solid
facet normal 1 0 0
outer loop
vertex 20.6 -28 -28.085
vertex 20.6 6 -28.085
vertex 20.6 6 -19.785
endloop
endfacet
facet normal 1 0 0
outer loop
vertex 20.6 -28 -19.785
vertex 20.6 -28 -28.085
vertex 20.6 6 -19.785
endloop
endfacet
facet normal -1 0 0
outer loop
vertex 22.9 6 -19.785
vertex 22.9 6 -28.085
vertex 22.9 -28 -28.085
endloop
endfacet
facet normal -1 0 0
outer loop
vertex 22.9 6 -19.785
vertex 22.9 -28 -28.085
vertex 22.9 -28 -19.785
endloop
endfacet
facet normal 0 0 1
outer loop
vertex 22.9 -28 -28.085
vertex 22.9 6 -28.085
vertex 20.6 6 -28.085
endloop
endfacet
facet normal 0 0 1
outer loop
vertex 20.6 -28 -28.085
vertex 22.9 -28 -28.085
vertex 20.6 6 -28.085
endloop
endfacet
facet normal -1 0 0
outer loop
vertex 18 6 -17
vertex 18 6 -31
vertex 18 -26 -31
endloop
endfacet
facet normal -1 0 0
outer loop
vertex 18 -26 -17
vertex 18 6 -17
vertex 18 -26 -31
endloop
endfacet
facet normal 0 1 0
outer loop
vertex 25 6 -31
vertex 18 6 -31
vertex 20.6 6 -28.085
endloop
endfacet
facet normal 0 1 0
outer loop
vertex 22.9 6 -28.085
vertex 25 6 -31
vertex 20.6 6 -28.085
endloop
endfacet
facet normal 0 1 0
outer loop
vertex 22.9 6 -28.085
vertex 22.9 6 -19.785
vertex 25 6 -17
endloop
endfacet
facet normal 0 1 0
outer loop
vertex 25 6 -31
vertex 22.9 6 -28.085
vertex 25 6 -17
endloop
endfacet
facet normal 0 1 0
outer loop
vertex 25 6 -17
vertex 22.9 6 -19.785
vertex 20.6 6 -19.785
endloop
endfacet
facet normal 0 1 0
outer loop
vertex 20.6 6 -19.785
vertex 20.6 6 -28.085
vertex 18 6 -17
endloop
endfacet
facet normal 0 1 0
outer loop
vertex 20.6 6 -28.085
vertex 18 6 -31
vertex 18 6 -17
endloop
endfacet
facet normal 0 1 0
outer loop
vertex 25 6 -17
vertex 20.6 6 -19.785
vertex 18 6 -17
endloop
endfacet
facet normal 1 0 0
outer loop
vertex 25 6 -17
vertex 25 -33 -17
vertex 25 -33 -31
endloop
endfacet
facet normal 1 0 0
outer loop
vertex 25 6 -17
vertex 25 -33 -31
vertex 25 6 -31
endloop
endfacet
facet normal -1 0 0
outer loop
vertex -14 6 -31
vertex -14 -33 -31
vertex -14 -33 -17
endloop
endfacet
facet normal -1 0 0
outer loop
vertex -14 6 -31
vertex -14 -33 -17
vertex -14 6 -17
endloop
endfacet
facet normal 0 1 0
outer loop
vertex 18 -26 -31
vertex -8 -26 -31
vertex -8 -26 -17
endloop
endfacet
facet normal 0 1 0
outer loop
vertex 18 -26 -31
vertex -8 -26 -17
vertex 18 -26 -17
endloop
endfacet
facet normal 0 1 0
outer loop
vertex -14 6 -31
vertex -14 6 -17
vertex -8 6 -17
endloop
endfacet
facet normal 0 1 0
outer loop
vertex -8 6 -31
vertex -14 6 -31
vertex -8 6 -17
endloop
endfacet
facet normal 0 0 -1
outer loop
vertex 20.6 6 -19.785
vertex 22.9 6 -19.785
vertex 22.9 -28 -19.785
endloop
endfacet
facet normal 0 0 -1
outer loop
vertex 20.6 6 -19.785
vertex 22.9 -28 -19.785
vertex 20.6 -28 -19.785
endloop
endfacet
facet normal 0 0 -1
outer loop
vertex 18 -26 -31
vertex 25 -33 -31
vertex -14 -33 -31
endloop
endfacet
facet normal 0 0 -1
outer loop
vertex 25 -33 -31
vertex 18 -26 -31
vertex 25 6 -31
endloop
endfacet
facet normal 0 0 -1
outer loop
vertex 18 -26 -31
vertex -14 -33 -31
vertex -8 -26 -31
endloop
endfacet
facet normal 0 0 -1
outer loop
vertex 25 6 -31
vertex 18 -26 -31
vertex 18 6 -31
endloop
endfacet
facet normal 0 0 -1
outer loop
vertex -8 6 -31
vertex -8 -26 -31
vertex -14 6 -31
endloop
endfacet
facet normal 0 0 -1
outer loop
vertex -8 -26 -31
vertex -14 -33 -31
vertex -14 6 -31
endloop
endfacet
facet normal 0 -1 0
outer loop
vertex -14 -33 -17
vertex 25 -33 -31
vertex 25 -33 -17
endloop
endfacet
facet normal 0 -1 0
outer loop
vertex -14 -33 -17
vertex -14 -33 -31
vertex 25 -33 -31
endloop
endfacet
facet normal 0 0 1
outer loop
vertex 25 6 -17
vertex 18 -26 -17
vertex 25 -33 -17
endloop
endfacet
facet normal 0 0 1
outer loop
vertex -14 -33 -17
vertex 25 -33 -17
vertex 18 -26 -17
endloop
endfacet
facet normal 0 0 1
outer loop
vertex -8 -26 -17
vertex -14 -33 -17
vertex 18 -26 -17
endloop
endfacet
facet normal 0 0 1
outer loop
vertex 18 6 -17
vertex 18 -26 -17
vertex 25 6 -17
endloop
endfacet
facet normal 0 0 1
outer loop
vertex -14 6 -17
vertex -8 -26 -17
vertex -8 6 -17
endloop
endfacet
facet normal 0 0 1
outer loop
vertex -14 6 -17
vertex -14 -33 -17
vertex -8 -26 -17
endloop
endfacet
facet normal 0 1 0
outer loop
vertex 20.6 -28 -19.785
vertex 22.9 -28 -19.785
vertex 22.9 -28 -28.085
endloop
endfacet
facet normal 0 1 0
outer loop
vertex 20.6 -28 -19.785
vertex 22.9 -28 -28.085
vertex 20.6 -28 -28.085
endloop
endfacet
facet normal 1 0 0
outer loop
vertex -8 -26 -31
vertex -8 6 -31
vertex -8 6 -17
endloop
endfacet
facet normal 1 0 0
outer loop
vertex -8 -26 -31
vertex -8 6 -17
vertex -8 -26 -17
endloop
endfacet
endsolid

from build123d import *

# Parameters (mm, degrees)
BOX_W           = 37
BOX_H           = 39
BOX_DEPTH       = 14
SKETCH_W        = 26
SKETCH_H        = 32
POCKET_DEPTH    = 15
SKETCH001_W     = 2.3
SKETCH001_H     = 8.3
POCKET001_DEPTH = 34
SKETCH002_W     = 39
SKETCH002_H     = 14
PAD001_DEPTH    = 2


with BuildPart() as part:
    # Box → Box (new body)
    with BuildSketch(Plane(origin=(-14, -33, -31), x_dir=(1, 0, 0), z_dir=(0, 0, 1))):
        with Locations((18.5, 19.5)):
            Rectangle(BOX_W, BOX_H)
    extrude(amount=BOX_DEPTH)

    # Sketch → Pocket (cut)
    with BuildSketch(Plane(origin=(-14, -33, -31), x_dir=(1, 0, 0), z_dir=(0, 0, -1))):
        with Locations((19, -23)):
            Rectangle(SKETCH_W, SKETCH_H)
    extrude(amount=-POCKET_DEPTH, mode=Mode.SUBTRACT)

    # Sketch001 → Pocket001 (cut)
    with BuildSketch(Plane(origin=(-14, 6, -31), x_dir=(-1, 0, 0), z_dir=(0, 1, 0))):
        with Locations((-35.75, 7.064953)):
            Rectangle(SKETCH001_W, SKETCH001_H)
    extrude(amount=-POCKET001_DEPTH, mode=Mode.SUBTRACT)

    # Sketch002 → Pad001 (new body)
    with BuildSketch(Plane(origin=(23, -33, -31), x_dir=(0, 1, 0), z_dir=(1, 0, 0))):
        with Locations((19.5, 7)):
            Rectangle(SKETCH002_W, SKETCH002_H)
    extrude(amount=PAD001_DEPTH)


solid = part.part
